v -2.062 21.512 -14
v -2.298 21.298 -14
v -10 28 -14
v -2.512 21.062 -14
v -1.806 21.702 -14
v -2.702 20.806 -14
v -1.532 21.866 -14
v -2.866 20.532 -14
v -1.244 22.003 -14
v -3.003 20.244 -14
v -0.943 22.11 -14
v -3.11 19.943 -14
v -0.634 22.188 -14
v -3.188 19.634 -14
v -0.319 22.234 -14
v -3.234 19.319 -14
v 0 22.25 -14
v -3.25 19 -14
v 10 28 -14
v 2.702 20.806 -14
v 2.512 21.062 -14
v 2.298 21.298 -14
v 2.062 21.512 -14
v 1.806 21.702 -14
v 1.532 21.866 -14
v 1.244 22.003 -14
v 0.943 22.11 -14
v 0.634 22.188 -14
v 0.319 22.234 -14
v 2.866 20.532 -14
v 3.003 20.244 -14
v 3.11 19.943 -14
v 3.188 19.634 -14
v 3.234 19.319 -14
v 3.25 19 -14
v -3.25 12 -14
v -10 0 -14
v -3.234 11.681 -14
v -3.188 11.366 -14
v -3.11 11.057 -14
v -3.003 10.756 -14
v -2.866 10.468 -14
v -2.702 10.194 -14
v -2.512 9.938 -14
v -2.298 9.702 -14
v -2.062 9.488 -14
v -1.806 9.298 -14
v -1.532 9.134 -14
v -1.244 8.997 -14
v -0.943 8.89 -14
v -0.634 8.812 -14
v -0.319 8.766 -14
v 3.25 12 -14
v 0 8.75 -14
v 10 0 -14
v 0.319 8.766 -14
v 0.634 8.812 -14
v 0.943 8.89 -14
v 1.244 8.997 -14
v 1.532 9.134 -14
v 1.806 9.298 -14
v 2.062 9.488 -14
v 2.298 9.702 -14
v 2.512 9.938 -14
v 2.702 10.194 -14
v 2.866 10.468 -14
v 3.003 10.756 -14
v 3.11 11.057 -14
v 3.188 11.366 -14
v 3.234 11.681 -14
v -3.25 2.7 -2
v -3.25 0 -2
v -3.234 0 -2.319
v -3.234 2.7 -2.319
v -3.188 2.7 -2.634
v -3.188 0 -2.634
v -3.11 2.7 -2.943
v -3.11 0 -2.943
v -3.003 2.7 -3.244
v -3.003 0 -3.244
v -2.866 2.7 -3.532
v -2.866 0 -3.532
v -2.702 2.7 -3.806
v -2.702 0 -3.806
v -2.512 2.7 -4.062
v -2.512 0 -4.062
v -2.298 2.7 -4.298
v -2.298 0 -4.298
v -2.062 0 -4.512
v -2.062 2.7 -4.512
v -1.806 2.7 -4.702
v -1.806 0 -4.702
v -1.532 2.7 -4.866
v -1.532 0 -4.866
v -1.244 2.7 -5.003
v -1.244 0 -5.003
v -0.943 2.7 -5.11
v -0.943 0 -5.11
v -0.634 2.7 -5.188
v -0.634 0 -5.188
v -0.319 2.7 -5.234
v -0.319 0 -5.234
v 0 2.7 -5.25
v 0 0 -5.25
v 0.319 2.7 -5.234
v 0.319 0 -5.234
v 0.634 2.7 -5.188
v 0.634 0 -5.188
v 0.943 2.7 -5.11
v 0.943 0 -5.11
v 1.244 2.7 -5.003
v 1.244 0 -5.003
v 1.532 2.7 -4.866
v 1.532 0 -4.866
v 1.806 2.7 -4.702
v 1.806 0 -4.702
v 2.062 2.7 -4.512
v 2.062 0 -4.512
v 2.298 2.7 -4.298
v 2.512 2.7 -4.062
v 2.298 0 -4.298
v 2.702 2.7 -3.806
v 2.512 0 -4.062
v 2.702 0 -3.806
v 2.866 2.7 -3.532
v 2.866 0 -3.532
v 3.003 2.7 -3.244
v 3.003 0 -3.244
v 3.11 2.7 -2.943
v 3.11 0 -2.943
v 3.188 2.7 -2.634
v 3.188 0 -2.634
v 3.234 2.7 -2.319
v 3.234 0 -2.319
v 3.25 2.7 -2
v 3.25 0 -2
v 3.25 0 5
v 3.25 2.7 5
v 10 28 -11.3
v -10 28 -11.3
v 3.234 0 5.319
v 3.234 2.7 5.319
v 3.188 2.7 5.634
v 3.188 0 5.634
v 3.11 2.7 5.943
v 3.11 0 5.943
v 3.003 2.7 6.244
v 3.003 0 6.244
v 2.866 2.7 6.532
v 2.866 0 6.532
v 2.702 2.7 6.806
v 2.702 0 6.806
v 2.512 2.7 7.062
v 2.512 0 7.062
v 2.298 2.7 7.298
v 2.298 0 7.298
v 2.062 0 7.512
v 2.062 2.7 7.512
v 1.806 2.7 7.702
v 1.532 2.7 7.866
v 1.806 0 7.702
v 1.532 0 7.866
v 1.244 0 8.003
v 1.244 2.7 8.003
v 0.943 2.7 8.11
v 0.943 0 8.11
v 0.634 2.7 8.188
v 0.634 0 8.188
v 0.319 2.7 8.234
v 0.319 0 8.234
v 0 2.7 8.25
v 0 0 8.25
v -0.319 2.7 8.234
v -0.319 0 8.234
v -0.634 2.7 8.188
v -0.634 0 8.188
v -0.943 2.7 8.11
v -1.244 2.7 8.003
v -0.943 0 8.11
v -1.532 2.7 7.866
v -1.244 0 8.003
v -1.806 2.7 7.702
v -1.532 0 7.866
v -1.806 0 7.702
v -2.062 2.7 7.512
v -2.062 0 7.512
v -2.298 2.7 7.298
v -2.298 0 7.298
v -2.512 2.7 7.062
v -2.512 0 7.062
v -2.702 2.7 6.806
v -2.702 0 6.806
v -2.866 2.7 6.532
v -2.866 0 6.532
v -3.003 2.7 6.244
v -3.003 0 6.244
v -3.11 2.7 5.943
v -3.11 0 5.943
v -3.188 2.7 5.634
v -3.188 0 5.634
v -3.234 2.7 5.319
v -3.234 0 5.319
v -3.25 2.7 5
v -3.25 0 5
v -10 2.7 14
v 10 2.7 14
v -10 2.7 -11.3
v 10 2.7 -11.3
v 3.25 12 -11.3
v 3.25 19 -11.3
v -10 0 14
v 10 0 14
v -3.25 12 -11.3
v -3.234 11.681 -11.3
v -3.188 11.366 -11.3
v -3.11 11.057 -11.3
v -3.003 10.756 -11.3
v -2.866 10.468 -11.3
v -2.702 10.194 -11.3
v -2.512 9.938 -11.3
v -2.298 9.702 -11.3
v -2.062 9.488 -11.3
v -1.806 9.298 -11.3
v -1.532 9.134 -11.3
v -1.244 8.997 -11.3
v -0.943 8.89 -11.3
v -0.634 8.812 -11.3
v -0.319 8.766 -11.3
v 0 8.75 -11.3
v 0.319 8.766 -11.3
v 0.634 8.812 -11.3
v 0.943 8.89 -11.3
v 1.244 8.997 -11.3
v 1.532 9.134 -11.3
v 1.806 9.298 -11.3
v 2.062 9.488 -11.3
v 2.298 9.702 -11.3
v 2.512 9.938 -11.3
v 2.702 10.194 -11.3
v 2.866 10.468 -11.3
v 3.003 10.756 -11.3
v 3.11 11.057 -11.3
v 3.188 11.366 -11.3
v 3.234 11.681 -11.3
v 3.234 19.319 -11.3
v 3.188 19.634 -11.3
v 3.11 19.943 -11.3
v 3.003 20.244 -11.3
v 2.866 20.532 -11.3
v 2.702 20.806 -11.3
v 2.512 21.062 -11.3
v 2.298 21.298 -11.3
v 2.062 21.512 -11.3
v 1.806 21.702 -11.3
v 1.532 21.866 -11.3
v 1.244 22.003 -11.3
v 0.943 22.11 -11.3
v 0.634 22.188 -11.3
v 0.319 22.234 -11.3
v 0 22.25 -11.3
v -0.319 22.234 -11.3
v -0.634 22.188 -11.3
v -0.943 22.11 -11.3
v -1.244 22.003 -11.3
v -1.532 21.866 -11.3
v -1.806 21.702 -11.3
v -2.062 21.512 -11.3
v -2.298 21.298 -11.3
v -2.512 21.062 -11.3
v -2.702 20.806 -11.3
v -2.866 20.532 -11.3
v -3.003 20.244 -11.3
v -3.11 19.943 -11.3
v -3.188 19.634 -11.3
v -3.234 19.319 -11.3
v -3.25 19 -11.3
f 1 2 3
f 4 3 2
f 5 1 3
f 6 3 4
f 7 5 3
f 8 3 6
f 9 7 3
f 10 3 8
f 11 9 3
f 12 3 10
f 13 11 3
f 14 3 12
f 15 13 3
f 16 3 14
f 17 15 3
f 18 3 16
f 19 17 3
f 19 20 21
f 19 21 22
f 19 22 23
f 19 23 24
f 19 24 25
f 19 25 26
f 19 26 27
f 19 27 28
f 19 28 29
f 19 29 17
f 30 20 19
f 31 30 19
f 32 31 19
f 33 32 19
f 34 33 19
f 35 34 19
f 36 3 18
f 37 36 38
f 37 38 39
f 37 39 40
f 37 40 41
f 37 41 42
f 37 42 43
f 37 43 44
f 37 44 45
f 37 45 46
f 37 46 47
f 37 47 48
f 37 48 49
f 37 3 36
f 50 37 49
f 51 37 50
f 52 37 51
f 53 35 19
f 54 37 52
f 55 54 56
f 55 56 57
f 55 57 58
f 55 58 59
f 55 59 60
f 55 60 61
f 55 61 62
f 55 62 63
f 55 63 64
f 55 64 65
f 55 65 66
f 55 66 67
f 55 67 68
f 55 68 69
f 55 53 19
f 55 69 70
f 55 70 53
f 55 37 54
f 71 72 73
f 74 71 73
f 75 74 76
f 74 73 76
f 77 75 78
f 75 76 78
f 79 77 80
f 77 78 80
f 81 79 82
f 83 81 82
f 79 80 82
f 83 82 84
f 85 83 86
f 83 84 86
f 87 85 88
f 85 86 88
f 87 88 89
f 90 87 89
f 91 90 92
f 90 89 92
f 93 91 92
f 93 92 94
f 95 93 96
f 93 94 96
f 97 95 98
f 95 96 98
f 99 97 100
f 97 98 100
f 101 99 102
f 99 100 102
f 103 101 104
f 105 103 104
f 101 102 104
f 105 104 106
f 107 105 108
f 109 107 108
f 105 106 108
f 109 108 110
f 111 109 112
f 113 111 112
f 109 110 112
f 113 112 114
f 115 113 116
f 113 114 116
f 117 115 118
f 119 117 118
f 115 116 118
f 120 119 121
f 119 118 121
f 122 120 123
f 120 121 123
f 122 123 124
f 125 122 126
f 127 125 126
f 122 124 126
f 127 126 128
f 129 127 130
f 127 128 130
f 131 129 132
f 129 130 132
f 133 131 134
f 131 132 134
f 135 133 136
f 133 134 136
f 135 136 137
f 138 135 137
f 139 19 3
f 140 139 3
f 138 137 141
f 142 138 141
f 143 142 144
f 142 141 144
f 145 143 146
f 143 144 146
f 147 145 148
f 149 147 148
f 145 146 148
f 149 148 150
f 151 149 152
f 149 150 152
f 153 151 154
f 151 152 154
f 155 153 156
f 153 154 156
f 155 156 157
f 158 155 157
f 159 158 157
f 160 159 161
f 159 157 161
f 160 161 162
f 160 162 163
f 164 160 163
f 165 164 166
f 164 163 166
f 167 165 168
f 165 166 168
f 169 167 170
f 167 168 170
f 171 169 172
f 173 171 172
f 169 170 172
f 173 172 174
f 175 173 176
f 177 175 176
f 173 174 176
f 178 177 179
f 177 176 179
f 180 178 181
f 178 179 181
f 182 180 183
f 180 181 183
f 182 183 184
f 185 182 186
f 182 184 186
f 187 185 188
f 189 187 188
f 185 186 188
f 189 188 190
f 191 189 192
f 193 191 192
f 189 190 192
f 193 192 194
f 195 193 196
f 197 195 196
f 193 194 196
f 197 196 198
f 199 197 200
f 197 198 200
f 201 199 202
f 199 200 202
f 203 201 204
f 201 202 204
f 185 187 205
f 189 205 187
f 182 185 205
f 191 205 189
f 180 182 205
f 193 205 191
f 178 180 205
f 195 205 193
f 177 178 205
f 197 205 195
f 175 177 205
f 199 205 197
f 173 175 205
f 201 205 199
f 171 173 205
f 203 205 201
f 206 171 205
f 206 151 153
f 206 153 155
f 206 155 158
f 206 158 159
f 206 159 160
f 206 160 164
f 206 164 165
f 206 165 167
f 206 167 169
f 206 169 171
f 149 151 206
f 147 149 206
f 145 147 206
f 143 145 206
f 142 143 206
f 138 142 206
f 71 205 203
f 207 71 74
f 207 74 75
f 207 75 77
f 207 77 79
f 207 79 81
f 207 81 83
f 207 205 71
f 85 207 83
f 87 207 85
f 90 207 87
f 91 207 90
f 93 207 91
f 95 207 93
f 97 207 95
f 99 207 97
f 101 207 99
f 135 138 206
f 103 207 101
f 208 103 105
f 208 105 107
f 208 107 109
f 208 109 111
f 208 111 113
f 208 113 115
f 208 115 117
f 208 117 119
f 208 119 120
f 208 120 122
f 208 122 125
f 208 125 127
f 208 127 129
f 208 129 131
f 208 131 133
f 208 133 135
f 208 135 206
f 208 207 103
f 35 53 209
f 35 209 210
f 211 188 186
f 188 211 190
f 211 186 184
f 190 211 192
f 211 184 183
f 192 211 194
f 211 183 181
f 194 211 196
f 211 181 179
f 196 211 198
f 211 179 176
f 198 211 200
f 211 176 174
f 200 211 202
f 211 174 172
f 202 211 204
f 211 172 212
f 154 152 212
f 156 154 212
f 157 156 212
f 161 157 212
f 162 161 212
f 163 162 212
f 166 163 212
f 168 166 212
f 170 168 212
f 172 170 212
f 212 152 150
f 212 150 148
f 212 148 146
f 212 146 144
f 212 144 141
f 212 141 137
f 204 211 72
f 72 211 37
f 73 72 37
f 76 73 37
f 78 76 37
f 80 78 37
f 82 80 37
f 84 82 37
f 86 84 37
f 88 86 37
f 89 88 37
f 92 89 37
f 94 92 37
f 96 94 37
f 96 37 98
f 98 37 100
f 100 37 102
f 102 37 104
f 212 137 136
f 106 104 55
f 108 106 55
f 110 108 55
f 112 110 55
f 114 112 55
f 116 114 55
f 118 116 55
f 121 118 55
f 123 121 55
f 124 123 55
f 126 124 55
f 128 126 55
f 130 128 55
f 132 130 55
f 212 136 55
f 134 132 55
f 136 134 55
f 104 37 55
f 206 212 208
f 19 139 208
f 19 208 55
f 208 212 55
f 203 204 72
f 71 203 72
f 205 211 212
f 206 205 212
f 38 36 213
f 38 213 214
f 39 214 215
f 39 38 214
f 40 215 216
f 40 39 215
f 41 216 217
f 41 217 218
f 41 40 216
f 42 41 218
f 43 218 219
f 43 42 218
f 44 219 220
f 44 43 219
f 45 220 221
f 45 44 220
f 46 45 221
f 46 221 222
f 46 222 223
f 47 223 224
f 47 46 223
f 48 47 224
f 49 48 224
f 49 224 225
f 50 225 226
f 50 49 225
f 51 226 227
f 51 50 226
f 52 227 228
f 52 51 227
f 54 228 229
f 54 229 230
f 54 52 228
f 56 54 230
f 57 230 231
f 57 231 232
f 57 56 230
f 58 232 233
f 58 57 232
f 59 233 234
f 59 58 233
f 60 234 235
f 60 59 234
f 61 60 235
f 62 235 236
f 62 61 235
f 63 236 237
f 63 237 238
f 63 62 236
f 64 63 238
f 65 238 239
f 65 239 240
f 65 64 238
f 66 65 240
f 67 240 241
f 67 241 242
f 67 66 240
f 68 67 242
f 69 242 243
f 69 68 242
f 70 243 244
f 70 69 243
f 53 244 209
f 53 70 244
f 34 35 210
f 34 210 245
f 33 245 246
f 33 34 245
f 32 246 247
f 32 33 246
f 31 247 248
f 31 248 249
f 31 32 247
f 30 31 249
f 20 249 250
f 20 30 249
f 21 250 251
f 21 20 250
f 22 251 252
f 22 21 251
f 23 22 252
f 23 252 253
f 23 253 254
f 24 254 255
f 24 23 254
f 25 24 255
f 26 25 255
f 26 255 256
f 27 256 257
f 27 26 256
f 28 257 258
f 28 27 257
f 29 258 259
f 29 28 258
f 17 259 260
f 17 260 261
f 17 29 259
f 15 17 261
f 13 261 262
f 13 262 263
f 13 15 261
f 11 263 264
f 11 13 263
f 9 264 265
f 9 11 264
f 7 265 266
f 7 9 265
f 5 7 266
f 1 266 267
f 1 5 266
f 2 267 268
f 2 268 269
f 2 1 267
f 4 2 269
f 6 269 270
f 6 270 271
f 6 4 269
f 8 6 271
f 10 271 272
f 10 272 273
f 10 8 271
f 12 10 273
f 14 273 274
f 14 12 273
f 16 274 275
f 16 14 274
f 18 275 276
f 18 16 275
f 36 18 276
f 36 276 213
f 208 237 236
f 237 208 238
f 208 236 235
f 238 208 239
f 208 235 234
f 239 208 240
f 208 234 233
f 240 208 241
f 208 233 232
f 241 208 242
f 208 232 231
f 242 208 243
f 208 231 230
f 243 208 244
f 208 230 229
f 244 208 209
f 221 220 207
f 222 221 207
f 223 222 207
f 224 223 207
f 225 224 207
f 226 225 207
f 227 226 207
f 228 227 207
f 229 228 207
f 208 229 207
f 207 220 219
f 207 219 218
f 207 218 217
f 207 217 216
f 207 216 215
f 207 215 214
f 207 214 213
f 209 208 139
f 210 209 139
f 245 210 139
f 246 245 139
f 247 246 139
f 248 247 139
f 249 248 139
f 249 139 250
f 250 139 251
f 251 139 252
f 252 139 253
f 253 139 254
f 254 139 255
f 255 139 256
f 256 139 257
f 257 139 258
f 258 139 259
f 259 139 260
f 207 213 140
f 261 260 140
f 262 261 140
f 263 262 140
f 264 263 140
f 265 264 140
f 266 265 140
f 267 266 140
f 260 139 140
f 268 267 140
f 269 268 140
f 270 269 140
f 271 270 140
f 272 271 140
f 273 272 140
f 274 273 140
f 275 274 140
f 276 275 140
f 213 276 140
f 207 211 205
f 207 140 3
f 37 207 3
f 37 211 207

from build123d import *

# Parameters (mm, degrees)
SKETCH_1_W      = 20
SKETCH_1_H      = 28
EXTRUDE_1_DEPTH = 2.7
SKETCH_2_W      = 20
SKETCH_2_H      = 28
EXTRUDE_2_DEPTH = 2.7


with BuildPart() as part:
    # 草图1 → 凸台-拉伸1 (new body)
    with BuildSketch(Plane(origin=(0, 0, 0), x_dir=(1, 0, 0), z_dir=(0, 1, 0))):
        Rectangle(SKETCH_1_W, SKETCH_1_H)
        with BuildLine():
            Line((3.25, 2), (3.25, -5))
            ThreePointArc((3.25, -5), (0, -8.25), (-3.25, -5))
            Line((-3.25, -5), (-3.25, 2))
            ThreePointArc((-3.25, 2), (0, 5.25), (3.25, 2))
        make_face(mode=Mode.SUBTRACT)
    extrude(amount=EXTRUDE_1_DEPTH)

    # 草图2 → 凸台-拉伸2 (add)
    with BuildSketch(Plane(origin=(0, 0, -14), x_dir=(-1, 0, 0), z_dir=(0, 0, -1))):
        with Locations((0, 14)):
            Rectangle(SKETCH_2_W, SKETCH_2_H)
        with BuildLine():
            Line((-3.25, 12), (-3.25, 19))
            ThreePointArc((-3.25, 19), (0, 22.25), (3.25, 19))
            Line((3.25, 19), (3.25, 12))
            ThreePointArc((3.25, 12), (0, 8.75), (-3.25, 12))
        make_face(mode=Mode.SUBTRACT)
    extrude(amount=-EXTRUDE_2_DEPTH)


solid = part.part
